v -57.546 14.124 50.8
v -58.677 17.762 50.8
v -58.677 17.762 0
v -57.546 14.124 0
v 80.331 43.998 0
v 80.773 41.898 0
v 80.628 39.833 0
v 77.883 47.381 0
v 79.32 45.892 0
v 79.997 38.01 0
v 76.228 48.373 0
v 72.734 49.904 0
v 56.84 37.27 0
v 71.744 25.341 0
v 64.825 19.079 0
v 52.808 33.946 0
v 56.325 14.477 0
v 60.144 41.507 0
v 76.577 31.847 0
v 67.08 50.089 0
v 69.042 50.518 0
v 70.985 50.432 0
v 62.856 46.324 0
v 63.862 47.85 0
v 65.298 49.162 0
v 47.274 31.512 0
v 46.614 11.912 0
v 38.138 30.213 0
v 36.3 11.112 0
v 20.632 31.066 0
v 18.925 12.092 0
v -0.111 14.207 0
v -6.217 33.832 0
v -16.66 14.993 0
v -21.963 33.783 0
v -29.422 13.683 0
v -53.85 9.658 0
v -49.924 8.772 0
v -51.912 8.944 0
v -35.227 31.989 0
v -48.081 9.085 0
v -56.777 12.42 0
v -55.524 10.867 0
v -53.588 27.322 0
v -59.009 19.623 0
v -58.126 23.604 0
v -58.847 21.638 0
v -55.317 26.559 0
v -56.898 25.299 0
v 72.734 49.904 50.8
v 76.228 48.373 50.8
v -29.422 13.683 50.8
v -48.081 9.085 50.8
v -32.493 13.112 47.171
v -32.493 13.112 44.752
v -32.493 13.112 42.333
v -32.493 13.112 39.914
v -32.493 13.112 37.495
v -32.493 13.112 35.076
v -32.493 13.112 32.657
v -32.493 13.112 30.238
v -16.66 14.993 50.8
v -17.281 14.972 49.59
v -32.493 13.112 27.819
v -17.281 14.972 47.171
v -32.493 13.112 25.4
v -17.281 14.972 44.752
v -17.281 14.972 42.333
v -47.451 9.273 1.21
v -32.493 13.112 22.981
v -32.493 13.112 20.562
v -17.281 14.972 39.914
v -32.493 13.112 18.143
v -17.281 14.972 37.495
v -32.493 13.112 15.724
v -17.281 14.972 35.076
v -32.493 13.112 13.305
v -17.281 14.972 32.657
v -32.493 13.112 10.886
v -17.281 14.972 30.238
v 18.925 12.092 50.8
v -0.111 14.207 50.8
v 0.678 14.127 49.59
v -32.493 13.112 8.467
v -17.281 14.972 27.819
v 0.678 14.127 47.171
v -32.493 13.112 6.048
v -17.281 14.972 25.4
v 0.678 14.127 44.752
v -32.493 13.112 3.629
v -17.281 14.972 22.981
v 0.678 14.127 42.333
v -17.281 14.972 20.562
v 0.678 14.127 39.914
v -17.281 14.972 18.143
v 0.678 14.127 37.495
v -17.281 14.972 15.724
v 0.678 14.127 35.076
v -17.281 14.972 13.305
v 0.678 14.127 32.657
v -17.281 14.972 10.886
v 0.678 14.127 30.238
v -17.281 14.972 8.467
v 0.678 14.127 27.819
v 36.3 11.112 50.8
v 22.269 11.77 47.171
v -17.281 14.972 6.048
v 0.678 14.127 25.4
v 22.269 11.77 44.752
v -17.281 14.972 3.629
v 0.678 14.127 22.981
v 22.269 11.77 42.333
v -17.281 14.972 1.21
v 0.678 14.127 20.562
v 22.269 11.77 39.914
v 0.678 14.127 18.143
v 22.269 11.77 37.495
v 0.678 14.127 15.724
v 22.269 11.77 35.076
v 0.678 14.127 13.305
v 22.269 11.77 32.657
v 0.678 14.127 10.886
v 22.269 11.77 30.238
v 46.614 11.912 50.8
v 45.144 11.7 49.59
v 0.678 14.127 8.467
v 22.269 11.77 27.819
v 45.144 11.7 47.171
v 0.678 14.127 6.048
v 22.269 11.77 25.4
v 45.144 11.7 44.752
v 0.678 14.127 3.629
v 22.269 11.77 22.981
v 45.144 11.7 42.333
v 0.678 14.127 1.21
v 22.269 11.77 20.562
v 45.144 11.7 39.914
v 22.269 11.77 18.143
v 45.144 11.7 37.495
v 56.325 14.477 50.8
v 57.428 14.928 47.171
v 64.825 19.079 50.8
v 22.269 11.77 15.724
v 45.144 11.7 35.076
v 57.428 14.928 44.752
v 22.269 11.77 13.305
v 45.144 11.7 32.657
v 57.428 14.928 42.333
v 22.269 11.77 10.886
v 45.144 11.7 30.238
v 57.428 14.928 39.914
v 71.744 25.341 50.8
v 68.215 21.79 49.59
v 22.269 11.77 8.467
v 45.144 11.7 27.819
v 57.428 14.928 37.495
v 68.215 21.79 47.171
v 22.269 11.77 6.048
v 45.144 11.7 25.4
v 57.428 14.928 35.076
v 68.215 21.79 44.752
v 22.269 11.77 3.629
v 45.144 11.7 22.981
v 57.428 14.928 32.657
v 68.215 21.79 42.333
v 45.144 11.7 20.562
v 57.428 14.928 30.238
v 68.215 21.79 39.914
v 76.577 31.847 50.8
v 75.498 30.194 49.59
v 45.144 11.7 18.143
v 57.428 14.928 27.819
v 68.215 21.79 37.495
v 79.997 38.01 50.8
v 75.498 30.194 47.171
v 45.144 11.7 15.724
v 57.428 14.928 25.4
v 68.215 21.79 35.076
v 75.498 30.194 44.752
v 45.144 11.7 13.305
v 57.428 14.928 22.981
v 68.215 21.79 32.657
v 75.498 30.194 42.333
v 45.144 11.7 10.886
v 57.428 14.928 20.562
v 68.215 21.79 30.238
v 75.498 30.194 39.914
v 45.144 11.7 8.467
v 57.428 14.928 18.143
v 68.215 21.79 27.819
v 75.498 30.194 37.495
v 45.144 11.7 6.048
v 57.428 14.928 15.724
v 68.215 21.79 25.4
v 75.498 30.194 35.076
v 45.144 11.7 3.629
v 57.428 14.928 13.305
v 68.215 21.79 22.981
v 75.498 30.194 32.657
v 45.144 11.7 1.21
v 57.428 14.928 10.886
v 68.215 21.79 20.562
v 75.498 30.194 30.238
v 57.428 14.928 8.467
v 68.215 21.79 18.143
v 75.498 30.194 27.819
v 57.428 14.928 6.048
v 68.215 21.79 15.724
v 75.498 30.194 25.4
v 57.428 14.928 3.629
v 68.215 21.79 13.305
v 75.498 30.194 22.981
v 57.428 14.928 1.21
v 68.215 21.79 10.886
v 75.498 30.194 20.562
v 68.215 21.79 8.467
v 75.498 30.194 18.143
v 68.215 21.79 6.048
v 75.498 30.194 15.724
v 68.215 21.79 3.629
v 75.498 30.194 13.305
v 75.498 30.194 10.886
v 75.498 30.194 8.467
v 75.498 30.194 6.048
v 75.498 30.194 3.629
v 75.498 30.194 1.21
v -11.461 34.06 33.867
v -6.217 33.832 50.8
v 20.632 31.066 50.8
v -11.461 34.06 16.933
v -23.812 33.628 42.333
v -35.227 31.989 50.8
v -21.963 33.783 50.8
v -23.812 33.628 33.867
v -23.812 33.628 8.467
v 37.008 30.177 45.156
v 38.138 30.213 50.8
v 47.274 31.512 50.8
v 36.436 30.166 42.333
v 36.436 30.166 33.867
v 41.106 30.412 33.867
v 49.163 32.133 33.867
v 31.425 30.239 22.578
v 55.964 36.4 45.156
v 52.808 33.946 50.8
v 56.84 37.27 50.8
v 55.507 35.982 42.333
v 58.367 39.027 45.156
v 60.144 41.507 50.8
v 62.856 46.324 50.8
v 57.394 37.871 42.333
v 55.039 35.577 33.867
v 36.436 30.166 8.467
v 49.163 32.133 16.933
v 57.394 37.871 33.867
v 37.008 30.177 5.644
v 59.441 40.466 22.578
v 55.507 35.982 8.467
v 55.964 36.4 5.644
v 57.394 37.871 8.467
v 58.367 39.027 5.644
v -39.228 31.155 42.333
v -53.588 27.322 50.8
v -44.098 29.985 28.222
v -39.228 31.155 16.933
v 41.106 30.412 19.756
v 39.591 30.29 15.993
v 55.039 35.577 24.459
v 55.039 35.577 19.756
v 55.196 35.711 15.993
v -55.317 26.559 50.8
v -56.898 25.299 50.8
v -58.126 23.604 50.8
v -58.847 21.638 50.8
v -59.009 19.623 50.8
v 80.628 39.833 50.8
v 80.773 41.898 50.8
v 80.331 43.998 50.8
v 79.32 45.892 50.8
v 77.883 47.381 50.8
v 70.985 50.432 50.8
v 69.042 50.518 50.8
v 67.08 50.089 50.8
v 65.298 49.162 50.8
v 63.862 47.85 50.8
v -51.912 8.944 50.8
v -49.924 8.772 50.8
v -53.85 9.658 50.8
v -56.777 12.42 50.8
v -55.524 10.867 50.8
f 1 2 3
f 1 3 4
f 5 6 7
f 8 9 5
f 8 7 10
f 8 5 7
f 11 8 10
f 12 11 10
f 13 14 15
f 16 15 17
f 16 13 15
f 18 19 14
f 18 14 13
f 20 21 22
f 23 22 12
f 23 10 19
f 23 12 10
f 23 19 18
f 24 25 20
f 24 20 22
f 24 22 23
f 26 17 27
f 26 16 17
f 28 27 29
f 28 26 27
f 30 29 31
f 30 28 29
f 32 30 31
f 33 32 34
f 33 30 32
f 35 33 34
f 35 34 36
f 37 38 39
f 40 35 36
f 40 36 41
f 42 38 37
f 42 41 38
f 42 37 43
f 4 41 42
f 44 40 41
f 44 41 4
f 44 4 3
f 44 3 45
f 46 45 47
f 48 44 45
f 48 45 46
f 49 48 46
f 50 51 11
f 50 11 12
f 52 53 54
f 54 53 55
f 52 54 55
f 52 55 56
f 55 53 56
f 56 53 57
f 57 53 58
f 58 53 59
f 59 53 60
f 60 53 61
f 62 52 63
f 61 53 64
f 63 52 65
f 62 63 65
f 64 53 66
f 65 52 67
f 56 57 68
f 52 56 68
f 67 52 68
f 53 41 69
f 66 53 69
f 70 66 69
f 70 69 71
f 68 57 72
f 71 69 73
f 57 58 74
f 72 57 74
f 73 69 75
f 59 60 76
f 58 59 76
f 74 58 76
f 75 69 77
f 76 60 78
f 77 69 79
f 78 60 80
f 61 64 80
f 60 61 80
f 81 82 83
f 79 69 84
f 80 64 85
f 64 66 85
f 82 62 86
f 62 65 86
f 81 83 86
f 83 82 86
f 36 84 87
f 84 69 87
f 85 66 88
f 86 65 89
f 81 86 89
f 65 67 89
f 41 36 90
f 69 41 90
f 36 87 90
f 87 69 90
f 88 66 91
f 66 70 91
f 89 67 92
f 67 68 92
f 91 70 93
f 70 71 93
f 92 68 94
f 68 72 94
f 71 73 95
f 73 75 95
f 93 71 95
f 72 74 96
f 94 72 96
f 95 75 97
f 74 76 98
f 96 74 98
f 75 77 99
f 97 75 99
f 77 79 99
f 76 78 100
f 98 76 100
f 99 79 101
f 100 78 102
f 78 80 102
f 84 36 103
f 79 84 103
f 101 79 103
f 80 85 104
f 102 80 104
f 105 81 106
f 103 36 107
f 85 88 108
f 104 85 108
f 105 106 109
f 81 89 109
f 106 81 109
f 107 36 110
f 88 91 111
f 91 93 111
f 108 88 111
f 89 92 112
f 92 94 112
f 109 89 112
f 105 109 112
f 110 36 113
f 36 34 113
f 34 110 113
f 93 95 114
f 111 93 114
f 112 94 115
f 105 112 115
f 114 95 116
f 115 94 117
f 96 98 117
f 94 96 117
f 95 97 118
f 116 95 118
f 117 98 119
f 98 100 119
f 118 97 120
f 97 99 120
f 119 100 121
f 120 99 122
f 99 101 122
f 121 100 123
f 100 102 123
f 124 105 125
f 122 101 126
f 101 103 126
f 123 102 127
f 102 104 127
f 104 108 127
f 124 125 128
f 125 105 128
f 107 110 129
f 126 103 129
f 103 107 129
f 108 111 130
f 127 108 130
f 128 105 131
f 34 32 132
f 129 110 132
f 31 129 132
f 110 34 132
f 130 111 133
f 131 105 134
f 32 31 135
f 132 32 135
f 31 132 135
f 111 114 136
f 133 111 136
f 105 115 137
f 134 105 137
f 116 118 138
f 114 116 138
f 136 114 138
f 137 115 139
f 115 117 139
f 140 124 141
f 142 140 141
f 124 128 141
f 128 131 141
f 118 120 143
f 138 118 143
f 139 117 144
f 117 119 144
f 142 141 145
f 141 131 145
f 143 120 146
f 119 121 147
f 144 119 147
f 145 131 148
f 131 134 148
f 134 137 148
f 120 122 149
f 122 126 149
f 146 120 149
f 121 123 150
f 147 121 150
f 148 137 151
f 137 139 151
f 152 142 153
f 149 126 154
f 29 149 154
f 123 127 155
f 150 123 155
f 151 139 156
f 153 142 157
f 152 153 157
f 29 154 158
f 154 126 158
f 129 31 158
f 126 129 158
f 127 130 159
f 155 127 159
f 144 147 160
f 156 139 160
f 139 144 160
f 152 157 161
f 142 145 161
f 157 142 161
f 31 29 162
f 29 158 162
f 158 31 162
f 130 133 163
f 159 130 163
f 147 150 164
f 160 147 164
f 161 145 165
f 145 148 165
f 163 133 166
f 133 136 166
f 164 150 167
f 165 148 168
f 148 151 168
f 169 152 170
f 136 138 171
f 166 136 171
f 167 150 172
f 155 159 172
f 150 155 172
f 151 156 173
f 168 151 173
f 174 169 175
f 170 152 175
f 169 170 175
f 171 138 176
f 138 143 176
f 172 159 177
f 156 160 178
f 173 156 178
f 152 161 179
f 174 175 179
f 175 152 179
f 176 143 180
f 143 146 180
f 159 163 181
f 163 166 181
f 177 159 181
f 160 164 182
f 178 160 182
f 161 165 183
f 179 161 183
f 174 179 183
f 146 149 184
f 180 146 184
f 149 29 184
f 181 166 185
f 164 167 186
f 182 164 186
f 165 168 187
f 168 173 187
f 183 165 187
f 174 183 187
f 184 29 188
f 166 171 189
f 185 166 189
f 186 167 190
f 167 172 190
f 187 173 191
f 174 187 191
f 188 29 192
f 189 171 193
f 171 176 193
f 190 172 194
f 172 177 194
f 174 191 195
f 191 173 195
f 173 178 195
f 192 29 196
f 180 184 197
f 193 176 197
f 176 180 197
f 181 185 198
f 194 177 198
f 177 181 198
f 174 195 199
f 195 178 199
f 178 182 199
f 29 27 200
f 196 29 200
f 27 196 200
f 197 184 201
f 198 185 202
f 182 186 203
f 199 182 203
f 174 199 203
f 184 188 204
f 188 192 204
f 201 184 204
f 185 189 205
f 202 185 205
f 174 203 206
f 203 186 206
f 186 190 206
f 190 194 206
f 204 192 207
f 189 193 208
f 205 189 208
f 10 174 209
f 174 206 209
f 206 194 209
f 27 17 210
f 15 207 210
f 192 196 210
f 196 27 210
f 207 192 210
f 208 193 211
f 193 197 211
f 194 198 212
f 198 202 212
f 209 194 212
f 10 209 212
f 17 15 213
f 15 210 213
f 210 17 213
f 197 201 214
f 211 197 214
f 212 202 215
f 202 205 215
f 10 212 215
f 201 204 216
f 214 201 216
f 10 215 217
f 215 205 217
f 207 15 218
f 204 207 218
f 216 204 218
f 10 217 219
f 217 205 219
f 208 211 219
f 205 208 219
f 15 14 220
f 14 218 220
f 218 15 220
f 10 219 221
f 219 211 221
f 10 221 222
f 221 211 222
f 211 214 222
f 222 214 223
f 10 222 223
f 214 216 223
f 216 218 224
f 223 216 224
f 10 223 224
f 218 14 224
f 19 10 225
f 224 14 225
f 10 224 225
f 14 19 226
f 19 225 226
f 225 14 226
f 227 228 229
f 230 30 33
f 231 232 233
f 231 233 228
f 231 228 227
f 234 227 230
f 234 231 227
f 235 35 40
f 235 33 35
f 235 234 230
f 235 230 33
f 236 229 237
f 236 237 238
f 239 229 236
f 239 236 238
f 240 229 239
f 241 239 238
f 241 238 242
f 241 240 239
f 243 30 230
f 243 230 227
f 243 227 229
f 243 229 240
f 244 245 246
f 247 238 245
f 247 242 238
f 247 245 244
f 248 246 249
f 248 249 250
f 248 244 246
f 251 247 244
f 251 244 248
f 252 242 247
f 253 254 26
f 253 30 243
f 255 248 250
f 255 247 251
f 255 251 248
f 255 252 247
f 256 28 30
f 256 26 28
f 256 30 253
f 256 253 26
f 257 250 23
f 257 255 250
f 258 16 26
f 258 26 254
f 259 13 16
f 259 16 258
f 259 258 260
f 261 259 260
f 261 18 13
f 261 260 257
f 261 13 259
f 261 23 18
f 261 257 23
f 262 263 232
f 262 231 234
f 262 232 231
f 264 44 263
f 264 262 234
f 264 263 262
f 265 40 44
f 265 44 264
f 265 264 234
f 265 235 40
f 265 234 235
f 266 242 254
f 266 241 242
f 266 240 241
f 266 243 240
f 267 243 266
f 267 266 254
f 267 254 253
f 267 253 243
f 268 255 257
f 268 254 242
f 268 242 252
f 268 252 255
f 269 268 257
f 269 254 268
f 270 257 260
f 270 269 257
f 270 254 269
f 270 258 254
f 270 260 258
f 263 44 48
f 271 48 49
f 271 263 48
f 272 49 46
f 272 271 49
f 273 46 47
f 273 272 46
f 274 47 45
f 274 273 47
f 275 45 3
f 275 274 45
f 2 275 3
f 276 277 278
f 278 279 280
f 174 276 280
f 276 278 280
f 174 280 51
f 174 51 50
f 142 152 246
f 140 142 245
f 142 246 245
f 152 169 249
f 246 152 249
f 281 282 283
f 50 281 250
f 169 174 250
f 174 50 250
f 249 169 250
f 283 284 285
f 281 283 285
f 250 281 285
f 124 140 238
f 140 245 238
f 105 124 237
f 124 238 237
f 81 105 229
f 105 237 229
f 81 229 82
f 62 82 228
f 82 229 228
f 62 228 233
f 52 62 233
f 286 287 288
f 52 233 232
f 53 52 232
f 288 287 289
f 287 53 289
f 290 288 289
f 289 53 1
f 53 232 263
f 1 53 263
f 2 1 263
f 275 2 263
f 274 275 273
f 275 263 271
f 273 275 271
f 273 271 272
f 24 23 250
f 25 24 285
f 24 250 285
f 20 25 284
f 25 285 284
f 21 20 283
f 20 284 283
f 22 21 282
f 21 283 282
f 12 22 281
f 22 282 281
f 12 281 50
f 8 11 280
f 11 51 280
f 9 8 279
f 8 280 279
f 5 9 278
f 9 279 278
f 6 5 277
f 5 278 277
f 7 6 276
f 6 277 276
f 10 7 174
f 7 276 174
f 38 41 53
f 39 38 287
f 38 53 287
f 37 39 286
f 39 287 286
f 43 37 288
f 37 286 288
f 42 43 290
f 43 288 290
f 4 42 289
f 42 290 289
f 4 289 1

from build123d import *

# Parameters (mm, degrees)
F1_DEPTH = 50.8
F2_R     = 7.62


# Not quite as in the source:
# - the dataset's text gives a spline's control points without its knots; the knots are read off the source's solid


with BuildPart() as f1:
    # F0 (on Top) → F1 (new body)
    with BuildSketch(Plane.XY):
        with BuildLine():
            add(Edge.make_bspline(
                [(-60.944698751, 25.0633750111), (-45.7793490355, 29.7747773681), (-13.9600111377, 39.6600557418), (52.5503573555, 22.5129103077), (62.0745263261, 44.2466254476), (65.8716857433, 52.911568433)],
                knots=[0, 0, 0, 0, 0.3538232256, 0.7423779196, 1, 1, 1, 1], degree=3))
            Line((-60.944698751, 25.0633750111), (-55.2929164482, 6.8710728807))
            add(Edge.make_bspline(
                [(-55.2929164482, 6.8710728807), (-52.6140805534, 7.7033038537), (-47.4018926145, 9.3216145558), (-39.8812064113, 11.4599835905), (-33.7309143498, 12.9050992109), (-28.786328872, 13.8133593735), (-25.0381264341, 14.3598557381), (-21.2209235546, 14.7600271905), (-17.9562000554, 14.9607026798), (-15.2780901655, 15.0339227144), (-13.5728145637, 15.0414720085), (-12.1886095674, 15.0234734602), (-10.7871900479, 14.9888942675), (-8.9608161671, 14.9139701297), (-6.6734196362, 14.777094689), (-3.5073038309, 14.5377383447), (0.6395111781, 14.1444456971), (5.8438148043, 13.5682562387), (11.2137603043, 12.9395763815), (16.6986316777, 12.3136570181), (22.2601288935, 11.7494341891), (27.874607408, 11.3110698362), (33.5371111559, 11.0724127396), (38.3117706057, 11.1160284257), (42.1895309058, 11.3615597133), (45.1357695567, 11.6738573232), (48.129006294, 12.141988219), (50.6694852802, 12.6913928111), (52.7311013888, 13.2486701903), (54.0315996583, 13.6515527053), (55.0779843338, 14.009843186), (55.8669552145, 14.298012218), (56.6538003886, 14.6043360697), (58.2057168856, 15.2466006567), (60.4616240485, 16.3243567042), (63.2791892362, 17.9768086998), (65.881457239, 19.8076647102), (69.0445974475, 22.4299995717), (72.4118941025, 25.9363734821), (75.608842099, 30.2136170314), (78.1408898176, 34.3749839674), (80.1842586198, 38.3192081065), (81.8837517412, 41.9864350032), (82.8592586587, 44.2143404913), (83.3198606056, 45.26541293)],
                knots=[0, 0, 0, 0, 0.0625, 0.125, 0.1875, 0.21875, 0.25, 0.28125, 0.3125, 0.328125, 0.34375, 0.3515625, 0.359375, 0.375, 0.390625, 0.40625, 0.4375, 0.46875, 0.5, 0.53125, 0.5625, 0.59375, 0.625, 0.65625, 0.671875, 0.6875, 0.703125, 0.71875, 0.7265625, 0.734375, 0.73828125, 0.7421875, 0.74609375, 0.75, 0.765625, 0.78125, 0.796875, 0.8125, 0.84375, 0.875, 0.90625, 0.9375, 0.96875, 1, 1, 1, 1], degree=3))
            Line((83.3198606056, 45.26541293), (65.8716857433, 52.911568433))
        make_face()
    extrude(amount=F1_DEPTH)

    # F2
    f2_edges = [f1.edges().sort_by_distance(p)[0] for p in [
        (65.871686, 52.911568, 25.4),
        (83.319861, 45.265413, 25.4),
        (-60.944699, 25.063375, 25.4),
        (-55.292916, 6.871073, 25.4),
    ]]
    fillet(f2_edges, radius=F2_R)


solid = f1.part
